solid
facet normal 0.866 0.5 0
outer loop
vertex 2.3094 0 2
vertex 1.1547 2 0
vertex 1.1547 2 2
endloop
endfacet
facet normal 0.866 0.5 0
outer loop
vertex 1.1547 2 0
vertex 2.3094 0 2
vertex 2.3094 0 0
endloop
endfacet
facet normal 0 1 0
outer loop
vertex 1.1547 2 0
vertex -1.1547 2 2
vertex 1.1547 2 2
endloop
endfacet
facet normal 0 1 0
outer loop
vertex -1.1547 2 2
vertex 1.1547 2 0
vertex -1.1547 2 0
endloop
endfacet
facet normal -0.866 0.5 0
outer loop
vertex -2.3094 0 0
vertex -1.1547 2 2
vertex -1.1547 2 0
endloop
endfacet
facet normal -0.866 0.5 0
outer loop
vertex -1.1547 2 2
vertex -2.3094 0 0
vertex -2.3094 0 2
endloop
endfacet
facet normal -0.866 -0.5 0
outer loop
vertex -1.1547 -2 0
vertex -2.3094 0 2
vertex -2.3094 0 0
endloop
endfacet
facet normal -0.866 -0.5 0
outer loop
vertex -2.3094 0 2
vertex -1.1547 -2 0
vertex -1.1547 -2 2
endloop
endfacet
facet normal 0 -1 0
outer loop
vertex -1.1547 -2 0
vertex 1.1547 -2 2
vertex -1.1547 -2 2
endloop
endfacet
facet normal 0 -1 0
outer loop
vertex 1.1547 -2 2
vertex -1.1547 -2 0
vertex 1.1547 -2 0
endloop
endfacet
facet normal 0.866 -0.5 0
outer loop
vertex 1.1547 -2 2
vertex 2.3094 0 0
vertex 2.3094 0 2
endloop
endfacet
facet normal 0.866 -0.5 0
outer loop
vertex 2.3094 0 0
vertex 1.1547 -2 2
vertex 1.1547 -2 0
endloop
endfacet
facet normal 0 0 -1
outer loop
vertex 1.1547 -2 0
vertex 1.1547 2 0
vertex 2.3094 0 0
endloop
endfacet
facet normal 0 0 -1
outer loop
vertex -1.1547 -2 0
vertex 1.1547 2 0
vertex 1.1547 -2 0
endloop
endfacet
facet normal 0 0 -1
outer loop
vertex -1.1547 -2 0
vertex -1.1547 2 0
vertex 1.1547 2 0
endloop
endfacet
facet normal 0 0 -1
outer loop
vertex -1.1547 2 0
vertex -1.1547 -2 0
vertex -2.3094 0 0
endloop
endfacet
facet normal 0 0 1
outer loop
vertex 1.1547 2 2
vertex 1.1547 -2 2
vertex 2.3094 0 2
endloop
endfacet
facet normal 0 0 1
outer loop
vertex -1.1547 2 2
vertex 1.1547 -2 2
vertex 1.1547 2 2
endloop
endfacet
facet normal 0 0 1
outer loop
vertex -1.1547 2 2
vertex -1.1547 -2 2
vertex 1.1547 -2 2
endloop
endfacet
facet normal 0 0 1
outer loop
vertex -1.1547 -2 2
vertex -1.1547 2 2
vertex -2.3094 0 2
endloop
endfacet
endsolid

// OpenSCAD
/* Cylinder */

// cylinder(h=10, r1=10, r2=0, $fn=5);

// 6-sided cylinder of radius 2 that is outside a circle of radius 2
fn = 6;
MakeOutside = 1/cos(180/fn);
cylinder(h=2, r = 2 * MakeOutside, $fn = fn);
